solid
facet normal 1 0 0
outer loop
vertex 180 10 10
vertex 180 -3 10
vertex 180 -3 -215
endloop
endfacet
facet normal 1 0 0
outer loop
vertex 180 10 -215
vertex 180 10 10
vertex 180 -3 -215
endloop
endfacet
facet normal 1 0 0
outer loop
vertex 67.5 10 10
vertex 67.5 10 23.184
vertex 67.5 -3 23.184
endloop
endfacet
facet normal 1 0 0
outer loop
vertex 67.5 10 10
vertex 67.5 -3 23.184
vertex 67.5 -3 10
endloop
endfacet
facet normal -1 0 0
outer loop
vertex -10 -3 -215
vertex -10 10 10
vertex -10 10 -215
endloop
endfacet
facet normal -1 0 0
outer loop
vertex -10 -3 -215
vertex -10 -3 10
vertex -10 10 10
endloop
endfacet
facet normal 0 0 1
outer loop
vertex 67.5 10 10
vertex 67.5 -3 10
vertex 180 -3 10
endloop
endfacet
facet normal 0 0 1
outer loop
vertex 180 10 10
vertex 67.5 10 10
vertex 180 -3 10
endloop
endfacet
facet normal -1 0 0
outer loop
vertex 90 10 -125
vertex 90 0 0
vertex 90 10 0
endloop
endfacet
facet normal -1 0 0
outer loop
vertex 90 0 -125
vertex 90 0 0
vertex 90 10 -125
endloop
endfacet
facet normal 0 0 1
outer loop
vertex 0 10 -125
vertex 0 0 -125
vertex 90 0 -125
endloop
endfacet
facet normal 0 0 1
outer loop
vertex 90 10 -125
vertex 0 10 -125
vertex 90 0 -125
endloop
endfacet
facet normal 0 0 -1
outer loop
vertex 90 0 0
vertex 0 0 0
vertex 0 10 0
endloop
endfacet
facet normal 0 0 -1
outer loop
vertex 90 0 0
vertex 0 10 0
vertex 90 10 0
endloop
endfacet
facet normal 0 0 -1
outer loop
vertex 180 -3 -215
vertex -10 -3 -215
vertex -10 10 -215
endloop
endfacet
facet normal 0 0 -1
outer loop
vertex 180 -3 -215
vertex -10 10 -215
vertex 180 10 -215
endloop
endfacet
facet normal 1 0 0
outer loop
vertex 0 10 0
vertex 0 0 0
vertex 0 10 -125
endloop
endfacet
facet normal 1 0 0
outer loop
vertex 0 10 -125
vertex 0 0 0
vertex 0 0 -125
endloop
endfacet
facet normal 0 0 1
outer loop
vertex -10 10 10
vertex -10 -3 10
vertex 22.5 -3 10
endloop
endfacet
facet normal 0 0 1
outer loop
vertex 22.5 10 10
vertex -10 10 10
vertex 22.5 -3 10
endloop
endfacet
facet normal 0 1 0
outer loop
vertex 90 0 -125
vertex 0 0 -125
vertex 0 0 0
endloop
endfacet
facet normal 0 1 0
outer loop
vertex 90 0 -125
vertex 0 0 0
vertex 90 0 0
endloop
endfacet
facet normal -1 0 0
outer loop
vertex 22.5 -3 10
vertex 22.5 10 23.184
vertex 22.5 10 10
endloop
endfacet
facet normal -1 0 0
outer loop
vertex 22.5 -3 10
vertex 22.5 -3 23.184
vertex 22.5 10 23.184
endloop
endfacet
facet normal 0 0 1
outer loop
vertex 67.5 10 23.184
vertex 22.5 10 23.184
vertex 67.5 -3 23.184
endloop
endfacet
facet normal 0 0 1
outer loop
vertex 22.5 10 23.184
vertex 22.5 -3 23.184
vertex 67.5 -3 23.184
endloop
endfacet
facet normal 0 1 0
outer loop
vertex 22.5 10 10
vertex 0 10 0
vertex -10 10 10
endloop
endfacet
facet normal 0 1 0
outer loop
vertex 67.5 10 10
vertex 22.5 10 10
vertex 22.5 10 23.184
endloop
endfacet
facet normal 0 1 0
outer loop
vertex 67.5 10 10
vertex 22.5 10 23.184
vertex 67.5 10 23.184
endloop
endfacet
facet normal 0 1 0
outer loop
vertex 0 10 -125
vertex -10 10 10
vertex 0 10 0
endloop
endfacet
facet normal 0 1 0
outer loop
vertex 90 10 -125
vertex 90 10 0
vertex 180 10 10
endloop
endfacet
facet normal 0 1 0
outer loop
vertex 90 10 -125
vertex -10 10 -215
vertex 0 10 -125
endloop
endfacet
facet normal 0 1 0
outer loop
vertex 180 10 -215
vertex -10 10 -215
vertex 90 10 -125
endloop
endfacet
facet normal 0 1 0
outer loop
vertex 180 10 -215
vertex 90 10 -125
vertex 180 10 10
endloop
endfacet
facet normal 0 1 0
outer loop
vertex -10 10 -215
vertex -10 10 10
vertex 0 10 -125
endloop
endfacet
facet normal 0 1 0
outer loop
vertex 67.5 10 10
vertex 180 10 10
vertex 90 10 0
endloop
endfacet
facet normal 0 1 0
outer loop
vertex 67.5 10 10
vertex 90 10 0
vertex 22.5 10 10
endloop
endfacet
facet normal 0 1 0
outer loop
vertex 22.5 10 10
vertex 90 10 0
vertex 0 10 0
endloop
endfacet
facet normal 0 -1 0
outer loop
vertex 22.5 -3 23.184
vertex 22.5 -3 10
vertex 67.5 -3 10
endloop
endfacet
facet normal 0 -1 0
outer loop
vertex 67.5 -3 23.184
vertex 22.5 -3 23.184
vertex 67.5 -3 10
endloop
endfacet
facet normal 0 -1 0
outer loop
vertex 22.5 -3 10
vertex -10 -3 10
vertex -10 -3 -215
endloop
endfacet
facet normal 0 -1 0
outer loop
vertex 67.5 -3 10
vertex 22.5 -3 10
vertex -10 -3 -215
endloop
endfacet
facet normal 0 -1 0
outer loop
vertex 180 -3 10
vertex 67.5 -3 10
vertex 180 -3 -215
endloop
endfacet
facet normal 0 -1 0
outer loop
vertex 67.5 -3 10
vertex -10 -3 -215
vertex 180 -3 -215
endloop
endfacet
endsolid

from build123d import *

# Parameters (mm, degrees)
BOSS_EXTRUDE1_DEPTH = 3
BOSS_EXTRUDE2_DEPTH = 10


with BuildPart() as part:
    # Sketch1 → Boss-Extrude1 (new body)
    with BuildSketch(Plane(origin=(0, 0, 0), x_dir=(1, 0, 0), z_dir=(0, 1, 0))):
        Polygon((-10, 215), (-10, -10), (22.5, -10), (22.5, -23.183655632), (67.5, -23.183655632), (67.5, -10), (180, -10), (180, 215), align=None)
    extrude(amount=-BOSS_EXTRUDE1_DEPTH)

    # Sketch1<3> → Boss-Extrude2 (add)
    with BuildSketch(Plane(origin=(0, 0, 0), x_dir=(1, 0, 0), z_dir=(0, 1, 0))):
        Polygon((-10, -10), (22.5, -10), (22.5, -23.183655632), (67.5, -23.183655632), (67.5, -10), (180, -10), (180, 215), (-10, 215), align=None)
        Polygon((90, 0), (45, 0), (0, 0), (0, 125), (90, 125), align=None, mode=Mode.SUBTRACT)
    extrude(amount=BOSS_EXTRUDE2_DEPTH)


solid = part.part
